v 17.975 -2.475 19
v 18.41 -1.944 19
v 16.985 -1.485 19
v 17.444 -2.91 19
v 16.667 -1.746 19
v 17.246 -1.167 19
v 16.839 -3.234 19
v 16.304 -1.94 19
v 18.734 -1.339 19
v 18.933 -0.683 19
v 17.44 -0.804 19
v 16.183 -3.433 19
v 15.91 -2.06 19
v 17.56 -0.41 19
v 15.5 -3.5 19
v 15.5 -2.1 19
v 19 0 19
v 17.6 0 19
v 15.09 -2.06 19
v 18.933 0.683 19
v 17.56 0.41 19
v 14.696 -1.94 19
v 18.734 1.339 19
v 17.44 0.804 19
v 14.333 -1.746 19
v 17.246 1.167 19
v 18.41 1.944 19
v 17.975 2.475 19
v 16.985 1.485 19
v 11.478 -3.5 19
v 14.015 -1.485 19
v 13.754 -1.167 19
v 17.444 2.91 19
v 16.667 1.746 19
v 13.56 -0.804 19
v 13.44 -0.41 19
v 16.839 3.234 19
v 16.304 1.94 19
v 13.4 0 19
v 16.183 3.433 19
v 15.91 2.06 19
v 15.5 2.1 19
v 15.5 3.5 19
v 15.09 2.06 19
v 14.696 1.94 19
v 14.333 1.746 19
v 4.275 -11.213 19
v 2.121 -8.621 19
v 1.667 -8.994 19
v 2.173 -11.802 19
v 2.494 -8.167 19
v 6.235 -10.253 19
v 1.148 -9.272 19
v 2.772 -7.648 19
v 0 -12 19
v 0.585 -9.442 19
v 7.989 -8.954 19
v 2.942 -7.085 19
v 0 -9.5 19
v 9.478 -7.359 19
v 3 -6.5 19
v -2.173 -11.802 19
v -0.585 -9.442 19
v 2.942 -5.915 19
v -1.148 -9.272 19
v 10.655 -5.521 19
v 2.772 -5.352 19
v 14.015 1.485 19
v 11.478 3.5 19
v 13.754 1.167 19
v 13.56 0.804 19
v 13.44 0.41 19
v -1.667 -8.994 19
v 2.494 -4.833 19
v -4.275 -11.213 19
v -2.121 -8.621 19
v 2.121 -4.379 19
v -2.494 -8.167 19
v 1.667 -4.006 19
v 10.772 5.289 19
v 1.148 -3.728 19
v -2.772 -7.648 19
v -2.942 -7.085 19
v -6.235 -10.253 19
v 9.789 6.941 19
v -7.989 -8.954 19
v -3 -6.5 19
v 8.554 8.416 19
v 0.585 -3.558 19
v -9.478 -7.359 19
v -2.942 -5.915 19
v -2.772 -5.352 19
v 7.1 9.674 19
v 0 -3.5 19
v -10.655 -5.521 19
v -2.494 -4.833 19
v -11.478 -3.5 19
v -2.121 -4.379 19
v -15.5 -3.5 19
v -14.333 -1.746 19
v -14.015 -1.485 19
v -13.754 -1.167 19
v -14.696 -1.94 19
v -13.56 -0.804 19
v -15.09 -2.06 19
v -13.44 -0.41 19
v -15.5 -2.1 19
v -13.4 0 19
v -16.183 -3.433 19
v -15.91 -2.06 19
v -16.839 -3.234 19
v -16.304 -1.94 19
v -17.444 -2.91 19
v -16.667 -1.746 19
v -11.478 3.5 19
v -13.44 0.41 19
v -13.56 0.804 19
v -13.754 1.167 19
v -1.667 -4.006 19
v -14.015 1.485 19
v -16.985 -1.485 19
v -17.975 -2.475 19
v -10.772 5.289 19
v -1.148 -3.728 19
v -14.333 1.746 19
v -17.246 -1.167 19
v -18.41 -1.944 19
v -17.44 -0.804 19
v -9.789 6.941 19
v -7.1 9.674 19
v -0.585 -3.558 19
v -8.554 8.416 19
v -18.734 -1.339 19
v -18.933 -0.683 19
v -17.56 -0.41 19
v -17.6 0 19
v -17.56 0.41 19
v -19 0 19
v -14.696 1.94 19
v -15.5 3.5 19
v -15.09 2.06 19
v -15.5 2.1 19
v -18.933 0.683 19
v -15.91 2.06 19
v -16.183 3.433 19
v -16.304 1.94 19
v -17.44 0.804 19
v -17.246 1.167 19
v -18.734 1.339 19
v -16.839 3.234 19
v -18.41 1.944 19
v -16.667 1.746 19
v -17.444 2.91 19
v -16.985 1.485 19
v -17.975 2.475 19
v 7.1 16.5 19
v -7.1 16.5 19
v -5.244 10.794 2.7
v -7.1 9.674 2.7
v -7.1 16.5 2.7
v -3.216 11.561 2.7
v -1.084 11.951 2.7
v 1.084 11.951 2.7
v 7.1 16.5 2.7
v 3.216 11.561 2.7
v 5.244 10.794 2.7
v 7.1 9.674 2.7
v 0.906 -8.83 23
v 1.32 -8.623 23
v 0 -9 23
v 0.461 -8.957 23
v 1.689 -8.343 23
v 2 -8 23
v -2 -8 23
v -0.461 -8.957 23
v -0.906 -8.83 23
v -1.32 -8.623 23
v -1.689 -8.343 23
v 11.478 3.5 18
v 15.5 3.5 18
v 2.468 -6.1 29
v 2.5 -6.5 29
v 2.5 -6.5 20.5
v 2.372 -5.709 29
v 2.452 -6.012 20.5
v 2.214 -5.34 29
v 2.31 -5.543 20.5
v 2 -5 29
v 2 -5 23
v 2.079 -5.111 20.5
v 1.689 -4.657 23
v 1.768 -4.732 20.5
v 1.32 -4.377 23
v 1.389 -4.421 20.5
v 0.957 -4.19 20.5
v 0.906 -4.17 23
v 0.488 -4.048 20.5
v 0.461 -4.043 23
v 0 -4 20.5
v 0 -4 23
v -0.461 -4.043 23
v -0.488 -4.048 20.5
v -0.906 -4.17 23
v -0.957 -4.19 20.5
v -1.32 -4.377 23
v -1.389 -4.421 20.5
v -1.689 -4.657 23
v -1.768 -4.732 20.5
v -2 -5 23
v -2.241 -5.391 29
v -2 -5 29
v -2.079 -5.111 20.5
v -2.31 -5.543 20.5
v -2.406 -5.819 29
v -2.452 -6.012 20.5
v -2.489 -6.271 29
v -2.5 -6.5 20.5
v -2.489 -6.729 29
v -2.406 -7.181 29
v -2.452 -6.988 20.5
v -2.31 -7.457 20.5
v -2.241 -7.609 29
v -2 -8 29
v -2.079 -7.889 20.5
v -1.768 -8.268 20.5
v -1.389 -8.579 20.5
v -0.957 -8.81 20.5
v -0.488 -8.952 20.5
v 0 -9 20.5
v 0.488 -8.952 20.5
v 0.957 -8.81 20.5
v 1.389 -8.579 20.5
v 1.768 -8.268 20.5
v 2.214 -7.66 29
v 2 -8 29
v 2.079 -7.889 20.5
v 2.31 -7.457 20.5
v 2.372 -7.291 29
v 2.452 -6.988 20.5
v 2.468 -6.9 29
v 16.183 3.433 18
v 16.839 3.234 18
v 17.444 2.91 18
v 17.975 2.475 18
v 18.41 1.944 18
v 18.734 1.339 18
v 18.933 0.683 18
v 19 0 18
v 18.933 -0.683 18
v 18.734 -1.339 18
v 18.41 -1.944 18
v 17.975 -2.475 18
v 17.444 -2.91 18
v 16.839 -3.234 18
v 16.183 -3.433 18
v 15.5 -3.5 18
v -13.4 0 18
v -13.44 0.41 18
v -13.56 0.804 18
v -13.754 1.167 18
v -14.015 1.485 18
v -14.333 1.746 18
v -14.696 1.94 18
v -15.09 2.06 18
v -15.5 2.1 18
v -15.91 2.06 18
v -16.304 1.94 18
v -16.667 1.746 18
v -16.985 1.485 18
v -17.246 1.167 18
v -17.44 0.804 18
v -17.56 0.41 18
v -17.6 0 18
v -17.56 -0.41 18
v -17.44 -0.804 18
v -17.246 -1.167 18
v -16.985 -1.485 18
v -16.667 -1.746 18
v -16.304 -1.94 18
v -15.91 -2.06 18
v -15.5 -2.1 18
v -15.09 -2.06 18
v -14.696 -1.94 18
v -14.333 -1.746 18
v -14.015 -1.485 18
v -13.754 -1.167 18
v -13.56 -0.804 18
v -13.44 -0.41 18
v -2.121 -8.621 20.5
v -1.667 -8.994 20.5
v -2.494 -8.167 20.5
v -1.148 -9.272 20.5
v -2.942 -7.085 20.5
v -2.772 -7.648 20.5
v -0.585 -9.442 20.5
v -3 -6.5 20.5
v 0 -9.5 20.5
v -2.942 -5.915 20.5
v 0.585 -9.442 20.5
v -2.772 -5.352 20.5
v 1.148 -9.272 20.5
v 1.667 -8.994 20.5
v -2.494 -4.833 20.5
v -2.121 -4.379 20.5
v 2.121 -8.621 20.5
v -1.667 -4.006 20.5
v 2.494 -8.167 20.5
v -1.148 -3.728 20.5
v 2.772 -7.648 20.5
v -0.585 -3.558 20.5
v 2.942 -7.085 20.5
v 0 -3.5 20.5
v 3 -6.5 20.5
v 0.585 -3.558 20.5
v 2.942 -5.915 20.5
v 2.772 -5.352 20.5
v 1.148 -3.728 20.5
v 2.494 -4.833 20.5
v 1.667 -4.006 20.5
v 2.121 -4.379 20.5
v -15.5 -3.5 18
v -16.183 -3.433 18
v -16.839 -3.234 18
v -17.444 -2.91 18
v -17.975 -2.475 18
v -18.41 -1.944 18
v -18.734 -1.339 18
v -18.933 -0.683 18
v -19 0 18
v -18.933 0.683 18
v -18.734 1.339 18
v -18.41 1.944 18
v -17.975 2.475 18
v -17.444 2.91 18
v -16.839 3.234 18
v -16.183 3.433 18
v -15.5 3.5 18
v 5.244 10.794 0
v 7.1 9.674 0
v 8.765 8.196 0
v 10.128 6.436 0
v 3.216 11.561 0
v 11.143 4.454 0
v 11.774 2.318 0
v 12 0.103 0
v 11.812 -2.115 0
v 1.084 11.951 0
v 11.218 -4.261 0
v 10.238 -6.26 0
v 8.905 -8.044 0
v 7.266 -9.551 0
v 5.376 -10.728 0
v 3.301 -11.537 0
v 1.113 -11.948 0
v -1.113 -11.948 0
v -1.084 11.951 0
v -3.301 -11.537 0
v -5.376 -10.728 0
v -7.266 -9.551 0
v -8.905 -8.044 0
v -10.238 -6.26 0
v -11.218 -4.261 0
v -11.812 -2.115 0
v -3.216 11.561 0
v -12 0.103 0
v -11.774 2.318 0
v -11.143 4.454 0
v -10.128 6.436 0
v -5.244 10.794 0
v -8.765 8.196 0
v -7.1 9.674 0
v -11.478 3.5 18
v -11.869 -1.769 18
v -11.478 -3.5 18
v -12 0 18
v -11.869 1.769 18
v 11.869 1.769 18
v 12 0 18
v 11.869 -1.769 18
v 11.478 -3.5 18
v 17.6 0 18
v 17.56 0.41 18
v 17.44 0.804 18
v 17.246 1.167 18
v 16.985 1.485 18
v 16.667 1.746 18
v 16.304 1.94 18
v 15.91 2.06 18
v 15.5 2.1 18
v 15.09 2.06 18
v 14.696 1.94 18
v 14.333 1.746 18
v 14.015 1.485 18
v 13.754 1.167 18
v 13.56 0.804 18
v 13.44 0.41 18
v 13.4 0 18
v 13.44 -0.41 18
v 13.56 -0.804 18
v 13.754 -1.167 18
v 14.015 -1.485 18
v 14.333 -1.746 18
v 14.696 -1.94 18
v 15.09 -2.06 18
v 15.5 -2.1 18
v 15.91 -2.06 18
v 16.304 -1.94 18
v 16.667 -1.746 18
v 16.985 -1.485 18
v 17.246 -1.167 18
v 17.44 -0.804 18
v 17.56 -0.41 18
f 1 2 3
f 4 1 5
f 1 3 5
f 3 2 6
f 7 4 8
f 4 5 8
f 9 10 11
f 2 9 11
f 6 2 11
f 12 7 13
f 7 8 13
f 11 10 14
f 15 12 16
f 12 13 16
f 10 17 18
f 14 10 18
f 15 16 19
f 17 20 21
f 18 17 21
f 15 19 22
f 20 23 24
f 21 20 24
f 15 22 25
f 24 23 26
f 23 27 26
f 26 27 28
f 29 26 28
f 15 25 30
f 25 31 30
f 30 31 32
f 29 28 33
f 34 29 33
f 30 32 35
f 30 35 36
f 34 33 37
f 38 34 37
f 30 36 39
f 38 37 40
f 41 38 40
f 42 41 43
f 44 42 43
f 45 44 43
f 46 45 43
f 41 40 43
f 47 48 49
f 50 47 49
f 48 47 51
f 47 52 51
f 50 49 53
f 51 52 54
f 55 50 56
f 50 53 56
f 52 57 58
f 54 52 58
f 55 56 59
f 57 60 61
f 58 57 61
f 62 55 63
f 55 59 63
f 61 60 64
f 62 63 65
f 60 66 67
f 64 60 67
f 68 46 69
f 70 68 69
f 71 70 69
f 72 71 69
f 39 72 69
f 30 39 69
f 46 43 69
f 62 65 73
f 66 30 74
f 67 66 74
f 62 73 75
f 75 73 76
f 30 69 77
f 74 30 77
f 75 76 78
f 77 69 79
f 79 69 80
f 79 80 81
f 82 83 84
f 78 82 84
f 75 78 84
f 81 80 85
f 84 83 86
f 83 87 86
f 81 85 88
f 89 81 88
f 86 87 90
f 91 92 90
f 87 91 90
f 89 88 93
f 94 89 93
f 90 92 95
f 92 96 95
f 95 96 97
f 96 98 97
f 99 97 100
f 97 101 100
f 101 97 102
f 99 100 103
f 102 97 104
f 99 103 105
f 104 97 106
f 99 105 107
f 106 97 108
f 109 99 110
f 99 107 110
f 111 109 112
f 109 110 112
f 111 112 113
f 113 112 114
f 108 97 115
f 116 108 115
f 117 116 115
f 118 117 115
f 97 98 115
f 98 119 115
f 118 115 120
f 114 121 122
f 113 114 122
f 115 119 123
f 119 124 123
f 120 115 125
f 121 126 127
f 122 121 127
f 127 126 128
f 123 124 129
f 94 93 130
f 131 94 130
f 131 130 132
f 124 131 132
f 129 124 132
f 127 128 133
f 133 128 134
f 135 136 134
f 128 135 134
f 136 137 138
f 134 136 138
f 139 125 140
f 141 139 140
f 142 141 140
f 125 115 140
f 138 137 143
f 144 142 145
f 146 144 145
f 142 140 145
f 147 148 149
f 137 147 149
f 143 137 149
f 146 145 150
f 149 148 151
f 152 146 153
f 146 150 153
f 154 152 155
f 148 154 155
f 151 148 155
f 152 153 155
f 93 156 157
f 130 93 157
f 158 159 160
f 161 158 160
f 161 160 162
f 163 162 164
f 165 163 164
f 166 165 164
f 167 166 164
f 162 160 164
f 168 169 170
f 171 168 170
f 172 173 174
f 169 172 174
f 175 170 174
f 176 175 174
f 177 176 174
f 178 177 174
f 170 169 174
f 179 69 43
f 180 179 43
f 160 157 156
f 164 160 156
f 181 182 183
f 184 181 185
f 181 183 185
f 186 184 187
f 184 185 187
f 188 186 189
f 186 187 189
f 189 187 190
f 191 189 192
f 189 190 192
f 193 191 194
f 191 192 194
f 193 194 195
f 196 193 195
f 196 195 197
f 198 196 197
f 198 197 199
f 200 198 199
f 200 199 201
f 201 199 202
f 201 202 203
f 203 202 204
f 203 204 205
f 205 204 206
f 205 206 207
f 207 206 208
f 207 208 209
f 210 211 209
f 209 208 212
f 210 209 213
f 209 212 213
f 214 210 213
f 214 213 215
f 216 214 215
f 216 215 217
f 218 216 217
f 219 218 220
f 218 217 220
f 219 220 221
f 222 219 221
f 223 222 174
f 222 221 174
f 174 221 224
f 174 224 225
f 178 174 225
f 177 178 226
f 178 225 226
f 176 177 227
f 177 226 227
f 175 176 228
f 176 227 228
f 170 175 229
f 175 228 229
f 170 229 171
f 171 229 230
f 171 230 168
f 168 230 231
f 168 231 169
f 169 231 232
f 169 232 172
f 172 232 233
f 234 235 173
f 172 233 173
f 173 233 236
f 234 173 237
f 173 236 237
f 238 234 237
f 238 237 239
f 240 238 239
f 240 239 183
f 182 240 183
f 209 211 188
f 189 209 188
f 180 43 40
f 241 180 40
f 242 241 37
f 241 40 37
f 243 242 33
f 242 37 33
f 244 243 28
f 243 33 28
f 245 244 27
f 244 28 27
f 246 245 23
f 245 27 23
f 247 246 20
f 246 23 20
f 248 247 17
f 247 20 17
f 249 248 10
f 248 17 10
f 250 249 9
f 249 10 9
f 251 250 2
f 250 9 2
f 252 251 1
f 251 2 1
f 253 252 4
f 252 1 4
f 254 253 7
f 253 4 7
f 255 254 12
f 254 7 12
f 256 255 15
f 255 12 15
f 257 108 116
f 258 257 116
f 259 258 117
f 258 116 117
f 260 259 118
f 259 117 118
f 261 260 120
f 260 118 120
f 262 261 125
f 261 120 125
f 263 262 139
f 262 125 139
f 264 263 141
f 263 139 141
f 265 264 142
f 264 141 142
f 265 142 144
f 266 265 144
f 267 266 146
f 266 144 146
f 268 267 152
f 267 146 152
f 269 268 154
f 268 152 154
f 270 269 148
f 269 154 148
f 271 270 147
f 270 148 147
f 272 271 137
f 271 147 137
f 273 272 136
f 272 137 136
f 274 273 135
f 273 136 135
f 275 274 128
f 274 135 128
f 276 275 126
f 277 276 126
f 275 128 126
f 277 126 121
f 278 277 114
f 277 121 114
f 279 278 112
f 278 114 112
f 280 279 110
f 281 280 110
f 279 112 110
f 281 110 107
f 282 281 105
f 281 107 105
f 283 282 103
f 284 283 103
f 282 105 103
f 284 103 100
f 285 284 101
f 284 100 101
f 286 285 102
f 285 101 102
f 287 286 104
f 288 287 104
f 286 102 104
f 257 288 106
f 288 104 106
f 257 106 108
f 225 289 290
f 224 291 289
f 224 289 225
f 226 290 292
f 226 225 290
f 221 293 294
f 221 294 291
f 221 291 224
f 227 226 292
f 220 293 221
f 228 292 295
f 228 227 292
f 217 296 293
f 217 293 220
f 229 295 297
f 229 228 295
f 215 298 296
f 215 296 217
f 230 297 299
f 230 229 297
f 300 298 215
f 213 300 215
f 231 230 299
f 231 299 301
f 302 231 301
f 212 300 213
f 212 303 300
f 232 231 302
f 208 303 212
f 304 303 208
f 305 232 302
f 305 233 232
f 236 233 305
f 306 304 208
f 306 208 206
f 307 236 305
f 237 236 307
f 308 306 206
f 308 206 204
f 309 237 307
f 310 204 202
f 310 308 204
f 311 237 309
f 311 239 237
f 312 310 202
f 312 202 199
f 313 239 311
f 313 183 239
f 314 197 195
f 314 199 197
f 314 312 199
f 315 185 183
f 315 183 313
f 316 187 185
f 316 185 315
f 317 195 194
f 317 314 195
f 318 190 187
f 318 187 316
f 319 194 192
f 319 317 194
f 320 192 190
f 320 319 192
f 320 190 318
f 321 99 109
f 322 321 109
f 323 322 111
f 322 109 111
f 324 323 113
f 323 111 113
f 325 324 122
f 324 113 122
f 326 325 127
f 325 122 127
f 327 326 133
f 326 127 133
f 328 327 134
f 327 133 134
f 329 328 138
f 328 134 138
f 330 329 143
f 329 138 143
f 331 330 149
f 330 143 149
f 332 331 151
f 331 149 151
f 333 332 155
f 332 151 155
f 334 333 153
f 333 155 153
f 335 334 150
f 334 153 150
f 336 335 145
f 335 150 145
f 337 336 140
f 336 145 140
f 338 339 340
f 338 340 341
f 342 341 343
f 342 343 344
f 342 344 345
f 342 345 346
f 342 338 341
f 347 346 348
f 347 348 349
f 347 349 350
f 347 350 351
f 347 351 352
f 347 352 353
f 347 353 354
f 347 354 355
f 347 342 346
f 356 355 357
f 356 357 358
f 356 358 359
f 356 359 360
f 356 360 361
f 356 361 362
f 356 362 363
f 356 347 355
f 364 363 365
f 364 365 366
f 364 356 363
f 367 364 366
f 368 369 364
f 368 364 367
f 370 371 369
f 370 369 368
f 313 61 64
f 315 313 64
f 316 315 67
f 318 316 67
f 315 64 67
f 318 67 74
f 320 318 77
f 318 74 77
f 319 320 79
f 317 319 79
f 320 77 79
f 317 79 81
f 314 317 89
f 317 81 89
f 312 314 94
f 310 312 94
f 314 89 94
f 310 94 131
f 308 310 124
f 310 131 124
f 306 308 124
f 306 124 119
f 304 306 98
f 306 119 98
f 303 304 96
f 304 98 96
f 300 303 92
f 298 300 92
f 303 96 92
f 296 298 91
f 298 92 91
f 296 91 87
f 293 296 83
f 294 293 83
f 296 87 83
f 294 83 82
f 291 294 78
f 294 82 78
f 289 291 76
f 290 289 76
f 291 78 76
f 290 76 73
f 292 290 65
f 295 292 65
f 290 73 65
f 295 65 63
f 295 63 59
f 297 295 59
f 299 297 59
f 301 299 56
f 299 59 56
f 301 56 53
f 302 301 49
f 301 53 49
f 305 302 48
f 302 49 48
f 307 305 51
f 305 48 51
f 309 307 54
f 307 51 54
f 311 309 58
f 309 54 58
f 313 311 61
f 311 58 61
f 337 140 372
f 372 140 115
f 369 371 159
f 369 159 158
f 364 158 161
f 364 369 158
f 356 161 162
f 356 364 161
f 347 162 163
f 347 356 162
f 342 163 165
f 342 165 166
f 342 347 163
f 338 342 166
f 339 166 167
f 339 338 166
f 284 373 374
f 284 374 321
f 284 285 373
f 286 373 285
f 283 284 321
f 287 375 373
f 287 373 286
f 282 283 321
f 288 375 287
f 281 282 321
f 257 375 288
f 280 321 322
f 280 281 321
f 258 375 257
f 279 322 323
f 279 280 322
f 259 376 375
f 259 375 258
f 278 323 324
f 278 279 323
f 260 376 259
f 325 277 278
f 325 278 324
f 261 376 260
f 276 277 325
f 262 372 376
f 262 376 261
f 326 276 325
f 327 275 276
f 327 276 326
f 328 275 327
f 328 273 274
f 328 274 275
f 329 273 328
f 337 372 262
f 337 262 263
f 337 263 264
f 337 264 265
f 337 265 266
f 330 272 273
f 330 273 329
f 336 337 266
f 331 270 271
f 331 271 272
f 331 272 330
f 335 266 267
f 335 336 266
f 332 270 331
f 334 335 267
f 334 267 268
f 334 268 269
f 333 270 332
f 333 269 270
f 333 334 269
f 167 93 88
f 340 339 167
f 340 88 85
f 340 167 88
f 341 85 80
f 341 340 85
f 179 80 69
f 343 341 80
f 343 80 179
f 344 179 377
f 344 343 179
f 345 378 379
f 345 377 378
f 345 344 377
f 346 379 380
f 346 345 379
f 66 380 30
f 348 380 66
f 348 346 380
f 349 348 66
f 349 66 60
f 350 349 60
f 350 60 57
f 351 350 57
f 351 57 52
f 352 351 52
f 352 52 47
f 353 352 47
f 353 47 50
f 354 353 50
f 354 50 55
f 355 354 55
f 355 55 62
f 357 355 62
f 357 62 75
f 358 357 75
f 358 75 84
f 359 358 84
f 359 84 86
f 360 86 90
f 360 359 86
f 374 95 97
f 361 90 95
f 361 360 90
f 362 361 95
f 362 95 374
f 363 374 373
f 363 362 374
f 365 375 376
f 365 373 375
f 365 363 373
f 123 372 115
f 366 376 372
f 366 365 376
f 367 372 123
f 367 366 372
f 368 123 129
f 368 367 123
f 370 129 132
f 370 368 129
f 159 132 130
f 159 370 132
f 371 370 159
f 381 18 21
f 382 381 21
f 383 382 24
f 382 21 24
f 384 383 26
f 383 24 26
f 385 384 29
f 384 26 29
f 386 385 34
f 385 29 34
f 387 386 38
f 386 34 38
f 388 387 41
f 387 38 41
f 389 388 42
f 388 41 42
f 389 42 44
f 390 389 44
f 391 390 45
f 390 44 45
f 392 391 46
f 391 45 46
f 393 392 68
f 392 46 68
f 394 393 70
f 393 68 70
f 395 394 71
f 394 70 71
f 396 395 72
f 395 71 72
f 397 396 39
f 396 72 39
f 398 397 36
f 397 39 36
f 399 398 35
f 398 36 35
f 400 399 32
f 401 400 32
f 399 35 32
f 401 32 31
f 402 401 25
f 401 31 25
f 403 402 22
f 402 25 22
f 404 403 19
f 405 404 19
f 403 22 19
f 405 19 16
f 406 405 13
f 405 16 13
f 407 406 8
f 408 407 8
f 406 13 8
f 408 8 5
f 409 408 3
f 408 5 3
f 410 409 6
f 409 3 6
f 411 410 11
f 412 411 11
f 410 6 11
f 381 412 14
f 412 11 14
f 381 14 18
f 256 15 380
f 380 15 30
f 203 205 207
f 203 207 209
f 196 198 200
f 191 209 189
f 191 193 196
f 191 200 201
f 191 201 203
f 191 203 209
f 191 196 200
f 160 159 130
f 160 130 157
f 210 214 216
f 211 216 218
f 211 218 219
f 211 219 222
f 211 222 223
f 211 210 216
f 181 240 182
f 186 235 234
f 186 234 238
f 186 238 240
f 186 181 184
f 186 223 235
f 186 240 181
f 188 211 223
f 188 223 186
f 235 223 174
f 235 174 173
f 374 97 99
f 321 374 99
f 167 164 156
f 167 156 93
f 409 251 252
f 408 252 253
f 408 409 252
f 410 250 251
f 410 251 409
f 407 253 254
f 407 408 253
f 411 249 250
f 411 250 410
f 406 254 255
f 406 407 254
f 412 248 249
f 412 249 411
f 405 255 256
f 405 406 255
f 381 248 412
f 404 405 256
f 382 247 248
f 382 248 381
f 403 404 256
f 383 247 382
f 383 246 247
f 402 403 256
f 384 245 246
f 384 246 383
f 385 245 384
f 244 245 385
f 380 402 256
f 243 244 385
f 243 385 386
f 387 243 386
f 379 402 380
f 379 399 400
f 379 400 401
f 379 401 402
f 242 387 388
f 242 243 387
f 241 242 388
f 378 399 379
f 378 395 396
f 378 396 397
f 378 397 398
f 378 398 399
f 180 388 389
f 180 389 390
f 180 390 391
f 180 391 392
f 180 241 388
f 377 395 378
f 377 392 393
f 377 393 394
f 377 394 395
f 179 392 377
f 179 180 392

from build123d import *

# Parameters (mm, degrees)
BOSS_EXTRUDE1_DEPTH = 19
CUT_EXTRUDE1_DEPTH  = 2.7
SKETCH3_R           = 2.1
BOSS_EXTRUDE2_DEPTH = 1
SKETCH4_R           = 3
BOSS_EXTRUDE3_DEPTH = 1.5
SKETCH5_R           = 2.5
BOSS_EXTRUDE5_DEPTH = 8.5
CUT_EXTRUDE2_DEPTH  = 6


with BuildPart() as part:
    # Sketch1 → Boss-Extrude1 (new body)
    with BuildSketch(Plane.XY):
        with BuildLine():
            Line((-7.1, 9.674192473), (-7.1, 16.5))
            Line((-7.1, 16.5), (7.1, 16.5))
            Line((7.1, 16.5), (7.1, 9.674192473))
            ThreePointArc((7.1, 9.674192473), (0, -12), (-7.1, 9.674192473))
        make_face()
    extrude(amount=BOSS_EXTRUDE1_DEPTH)

    # Sketch2 → Cut-Extrude1 (cut)
    with BuildSketch(Plane(origin=(0, 0, 0), x_dir=(-1, 0, 0), z_dir=(0, 0, -1))):
        with BuildLine():
            Line((7.1, 16.5), (7.1, 9.674192473))
            ThreePointArc((7.1, 9.674192473), (0, 12), (-7.1, 9.674192473))
            Line((-7.1, 9.674192473), (-7.1, 16.5))
            Line((-7.1, 16.5), (7.1, 16.5))
        make_face()
    extrude(amount=-CUT_EXTRUDE1_DEPTH, mode=Mode.SUBTRACT)

    # Sketch3 → Boss-Extrude2 (add)
    with BuildSketch(Plane.XY.offset(19)):
        with BuildLine():
            Line((-15.5, 3.5), (-11.478240283, 3.5))
            ThreePointArc((-11.478240283, 3.5), (-12, 0), (-11.478240283, -3.5))
            Line((-11.478240283, -3.5), (-15.5, -3.5))
            ThreePointArc((-15.5, -3.5), (-19, 0), (-15.5, 3.5))
        make_face()
        with Locations((-15.5, 0)):
            Circle(SKETCH3_R, mode=Mode.SUBTRACT)
        with BuildLine():
            Line((11.478240283, 3.5), (15.5, 3.5))
            ThreePointArc((15.5, 3.5), (19, 0), (15.5, -3.5))
            Line((15.5, -3.5), (11.478240283, -3.5))
            ThreePointArc((11.478240283, -3.5), (12, 0), (11.478240283, 3.5))
        make_face()
        with Locations((15.5, 0)):
            Circle(SKETCH3_R, mode=Mode.SUBTRACT)
    extrude(amount=-BOSS_EXTRUDE2_DEPTH)

    # Sketch4 → Boss-Extrude3 (add)
    with BuildSketch(Plane.XY.offset(19)):
        with Locations((0, -6.5)):
            Circle(SKETCH4_R)
    extrude(amount=BOSS_EXTRUDE3_DEPTH)

    # Sketch5 → Boss-Extrude5 (add)
    with BuildSketch(Plane.XY.offset(20.5)):
        with Locations((0, -6.5)):
            Circle(SKETCH5_R)
    extrude(amount=BOSS_EXTRUDE5_DEPTH)

    # Sketch7 → Cut-Extrude2 (cut)
    with BuildSketch(Plane.XY.offset(29)):
        with BuildLine():
            Line((-2, -5), (2, -5))
            ThreePointArc((2, -5), (0, -4), (-2, -5))
        make_face()
        with BuildLine():
            Line((-2, -8), (2, -8))
            ThreePointArc((2, -8), (0, -9), (-2, -8))
        make_face()
    extrude(amount=-CUT_EXTRUDE2_DEPTH, mode=Mode.SUBTRACT)


solid = part.part
